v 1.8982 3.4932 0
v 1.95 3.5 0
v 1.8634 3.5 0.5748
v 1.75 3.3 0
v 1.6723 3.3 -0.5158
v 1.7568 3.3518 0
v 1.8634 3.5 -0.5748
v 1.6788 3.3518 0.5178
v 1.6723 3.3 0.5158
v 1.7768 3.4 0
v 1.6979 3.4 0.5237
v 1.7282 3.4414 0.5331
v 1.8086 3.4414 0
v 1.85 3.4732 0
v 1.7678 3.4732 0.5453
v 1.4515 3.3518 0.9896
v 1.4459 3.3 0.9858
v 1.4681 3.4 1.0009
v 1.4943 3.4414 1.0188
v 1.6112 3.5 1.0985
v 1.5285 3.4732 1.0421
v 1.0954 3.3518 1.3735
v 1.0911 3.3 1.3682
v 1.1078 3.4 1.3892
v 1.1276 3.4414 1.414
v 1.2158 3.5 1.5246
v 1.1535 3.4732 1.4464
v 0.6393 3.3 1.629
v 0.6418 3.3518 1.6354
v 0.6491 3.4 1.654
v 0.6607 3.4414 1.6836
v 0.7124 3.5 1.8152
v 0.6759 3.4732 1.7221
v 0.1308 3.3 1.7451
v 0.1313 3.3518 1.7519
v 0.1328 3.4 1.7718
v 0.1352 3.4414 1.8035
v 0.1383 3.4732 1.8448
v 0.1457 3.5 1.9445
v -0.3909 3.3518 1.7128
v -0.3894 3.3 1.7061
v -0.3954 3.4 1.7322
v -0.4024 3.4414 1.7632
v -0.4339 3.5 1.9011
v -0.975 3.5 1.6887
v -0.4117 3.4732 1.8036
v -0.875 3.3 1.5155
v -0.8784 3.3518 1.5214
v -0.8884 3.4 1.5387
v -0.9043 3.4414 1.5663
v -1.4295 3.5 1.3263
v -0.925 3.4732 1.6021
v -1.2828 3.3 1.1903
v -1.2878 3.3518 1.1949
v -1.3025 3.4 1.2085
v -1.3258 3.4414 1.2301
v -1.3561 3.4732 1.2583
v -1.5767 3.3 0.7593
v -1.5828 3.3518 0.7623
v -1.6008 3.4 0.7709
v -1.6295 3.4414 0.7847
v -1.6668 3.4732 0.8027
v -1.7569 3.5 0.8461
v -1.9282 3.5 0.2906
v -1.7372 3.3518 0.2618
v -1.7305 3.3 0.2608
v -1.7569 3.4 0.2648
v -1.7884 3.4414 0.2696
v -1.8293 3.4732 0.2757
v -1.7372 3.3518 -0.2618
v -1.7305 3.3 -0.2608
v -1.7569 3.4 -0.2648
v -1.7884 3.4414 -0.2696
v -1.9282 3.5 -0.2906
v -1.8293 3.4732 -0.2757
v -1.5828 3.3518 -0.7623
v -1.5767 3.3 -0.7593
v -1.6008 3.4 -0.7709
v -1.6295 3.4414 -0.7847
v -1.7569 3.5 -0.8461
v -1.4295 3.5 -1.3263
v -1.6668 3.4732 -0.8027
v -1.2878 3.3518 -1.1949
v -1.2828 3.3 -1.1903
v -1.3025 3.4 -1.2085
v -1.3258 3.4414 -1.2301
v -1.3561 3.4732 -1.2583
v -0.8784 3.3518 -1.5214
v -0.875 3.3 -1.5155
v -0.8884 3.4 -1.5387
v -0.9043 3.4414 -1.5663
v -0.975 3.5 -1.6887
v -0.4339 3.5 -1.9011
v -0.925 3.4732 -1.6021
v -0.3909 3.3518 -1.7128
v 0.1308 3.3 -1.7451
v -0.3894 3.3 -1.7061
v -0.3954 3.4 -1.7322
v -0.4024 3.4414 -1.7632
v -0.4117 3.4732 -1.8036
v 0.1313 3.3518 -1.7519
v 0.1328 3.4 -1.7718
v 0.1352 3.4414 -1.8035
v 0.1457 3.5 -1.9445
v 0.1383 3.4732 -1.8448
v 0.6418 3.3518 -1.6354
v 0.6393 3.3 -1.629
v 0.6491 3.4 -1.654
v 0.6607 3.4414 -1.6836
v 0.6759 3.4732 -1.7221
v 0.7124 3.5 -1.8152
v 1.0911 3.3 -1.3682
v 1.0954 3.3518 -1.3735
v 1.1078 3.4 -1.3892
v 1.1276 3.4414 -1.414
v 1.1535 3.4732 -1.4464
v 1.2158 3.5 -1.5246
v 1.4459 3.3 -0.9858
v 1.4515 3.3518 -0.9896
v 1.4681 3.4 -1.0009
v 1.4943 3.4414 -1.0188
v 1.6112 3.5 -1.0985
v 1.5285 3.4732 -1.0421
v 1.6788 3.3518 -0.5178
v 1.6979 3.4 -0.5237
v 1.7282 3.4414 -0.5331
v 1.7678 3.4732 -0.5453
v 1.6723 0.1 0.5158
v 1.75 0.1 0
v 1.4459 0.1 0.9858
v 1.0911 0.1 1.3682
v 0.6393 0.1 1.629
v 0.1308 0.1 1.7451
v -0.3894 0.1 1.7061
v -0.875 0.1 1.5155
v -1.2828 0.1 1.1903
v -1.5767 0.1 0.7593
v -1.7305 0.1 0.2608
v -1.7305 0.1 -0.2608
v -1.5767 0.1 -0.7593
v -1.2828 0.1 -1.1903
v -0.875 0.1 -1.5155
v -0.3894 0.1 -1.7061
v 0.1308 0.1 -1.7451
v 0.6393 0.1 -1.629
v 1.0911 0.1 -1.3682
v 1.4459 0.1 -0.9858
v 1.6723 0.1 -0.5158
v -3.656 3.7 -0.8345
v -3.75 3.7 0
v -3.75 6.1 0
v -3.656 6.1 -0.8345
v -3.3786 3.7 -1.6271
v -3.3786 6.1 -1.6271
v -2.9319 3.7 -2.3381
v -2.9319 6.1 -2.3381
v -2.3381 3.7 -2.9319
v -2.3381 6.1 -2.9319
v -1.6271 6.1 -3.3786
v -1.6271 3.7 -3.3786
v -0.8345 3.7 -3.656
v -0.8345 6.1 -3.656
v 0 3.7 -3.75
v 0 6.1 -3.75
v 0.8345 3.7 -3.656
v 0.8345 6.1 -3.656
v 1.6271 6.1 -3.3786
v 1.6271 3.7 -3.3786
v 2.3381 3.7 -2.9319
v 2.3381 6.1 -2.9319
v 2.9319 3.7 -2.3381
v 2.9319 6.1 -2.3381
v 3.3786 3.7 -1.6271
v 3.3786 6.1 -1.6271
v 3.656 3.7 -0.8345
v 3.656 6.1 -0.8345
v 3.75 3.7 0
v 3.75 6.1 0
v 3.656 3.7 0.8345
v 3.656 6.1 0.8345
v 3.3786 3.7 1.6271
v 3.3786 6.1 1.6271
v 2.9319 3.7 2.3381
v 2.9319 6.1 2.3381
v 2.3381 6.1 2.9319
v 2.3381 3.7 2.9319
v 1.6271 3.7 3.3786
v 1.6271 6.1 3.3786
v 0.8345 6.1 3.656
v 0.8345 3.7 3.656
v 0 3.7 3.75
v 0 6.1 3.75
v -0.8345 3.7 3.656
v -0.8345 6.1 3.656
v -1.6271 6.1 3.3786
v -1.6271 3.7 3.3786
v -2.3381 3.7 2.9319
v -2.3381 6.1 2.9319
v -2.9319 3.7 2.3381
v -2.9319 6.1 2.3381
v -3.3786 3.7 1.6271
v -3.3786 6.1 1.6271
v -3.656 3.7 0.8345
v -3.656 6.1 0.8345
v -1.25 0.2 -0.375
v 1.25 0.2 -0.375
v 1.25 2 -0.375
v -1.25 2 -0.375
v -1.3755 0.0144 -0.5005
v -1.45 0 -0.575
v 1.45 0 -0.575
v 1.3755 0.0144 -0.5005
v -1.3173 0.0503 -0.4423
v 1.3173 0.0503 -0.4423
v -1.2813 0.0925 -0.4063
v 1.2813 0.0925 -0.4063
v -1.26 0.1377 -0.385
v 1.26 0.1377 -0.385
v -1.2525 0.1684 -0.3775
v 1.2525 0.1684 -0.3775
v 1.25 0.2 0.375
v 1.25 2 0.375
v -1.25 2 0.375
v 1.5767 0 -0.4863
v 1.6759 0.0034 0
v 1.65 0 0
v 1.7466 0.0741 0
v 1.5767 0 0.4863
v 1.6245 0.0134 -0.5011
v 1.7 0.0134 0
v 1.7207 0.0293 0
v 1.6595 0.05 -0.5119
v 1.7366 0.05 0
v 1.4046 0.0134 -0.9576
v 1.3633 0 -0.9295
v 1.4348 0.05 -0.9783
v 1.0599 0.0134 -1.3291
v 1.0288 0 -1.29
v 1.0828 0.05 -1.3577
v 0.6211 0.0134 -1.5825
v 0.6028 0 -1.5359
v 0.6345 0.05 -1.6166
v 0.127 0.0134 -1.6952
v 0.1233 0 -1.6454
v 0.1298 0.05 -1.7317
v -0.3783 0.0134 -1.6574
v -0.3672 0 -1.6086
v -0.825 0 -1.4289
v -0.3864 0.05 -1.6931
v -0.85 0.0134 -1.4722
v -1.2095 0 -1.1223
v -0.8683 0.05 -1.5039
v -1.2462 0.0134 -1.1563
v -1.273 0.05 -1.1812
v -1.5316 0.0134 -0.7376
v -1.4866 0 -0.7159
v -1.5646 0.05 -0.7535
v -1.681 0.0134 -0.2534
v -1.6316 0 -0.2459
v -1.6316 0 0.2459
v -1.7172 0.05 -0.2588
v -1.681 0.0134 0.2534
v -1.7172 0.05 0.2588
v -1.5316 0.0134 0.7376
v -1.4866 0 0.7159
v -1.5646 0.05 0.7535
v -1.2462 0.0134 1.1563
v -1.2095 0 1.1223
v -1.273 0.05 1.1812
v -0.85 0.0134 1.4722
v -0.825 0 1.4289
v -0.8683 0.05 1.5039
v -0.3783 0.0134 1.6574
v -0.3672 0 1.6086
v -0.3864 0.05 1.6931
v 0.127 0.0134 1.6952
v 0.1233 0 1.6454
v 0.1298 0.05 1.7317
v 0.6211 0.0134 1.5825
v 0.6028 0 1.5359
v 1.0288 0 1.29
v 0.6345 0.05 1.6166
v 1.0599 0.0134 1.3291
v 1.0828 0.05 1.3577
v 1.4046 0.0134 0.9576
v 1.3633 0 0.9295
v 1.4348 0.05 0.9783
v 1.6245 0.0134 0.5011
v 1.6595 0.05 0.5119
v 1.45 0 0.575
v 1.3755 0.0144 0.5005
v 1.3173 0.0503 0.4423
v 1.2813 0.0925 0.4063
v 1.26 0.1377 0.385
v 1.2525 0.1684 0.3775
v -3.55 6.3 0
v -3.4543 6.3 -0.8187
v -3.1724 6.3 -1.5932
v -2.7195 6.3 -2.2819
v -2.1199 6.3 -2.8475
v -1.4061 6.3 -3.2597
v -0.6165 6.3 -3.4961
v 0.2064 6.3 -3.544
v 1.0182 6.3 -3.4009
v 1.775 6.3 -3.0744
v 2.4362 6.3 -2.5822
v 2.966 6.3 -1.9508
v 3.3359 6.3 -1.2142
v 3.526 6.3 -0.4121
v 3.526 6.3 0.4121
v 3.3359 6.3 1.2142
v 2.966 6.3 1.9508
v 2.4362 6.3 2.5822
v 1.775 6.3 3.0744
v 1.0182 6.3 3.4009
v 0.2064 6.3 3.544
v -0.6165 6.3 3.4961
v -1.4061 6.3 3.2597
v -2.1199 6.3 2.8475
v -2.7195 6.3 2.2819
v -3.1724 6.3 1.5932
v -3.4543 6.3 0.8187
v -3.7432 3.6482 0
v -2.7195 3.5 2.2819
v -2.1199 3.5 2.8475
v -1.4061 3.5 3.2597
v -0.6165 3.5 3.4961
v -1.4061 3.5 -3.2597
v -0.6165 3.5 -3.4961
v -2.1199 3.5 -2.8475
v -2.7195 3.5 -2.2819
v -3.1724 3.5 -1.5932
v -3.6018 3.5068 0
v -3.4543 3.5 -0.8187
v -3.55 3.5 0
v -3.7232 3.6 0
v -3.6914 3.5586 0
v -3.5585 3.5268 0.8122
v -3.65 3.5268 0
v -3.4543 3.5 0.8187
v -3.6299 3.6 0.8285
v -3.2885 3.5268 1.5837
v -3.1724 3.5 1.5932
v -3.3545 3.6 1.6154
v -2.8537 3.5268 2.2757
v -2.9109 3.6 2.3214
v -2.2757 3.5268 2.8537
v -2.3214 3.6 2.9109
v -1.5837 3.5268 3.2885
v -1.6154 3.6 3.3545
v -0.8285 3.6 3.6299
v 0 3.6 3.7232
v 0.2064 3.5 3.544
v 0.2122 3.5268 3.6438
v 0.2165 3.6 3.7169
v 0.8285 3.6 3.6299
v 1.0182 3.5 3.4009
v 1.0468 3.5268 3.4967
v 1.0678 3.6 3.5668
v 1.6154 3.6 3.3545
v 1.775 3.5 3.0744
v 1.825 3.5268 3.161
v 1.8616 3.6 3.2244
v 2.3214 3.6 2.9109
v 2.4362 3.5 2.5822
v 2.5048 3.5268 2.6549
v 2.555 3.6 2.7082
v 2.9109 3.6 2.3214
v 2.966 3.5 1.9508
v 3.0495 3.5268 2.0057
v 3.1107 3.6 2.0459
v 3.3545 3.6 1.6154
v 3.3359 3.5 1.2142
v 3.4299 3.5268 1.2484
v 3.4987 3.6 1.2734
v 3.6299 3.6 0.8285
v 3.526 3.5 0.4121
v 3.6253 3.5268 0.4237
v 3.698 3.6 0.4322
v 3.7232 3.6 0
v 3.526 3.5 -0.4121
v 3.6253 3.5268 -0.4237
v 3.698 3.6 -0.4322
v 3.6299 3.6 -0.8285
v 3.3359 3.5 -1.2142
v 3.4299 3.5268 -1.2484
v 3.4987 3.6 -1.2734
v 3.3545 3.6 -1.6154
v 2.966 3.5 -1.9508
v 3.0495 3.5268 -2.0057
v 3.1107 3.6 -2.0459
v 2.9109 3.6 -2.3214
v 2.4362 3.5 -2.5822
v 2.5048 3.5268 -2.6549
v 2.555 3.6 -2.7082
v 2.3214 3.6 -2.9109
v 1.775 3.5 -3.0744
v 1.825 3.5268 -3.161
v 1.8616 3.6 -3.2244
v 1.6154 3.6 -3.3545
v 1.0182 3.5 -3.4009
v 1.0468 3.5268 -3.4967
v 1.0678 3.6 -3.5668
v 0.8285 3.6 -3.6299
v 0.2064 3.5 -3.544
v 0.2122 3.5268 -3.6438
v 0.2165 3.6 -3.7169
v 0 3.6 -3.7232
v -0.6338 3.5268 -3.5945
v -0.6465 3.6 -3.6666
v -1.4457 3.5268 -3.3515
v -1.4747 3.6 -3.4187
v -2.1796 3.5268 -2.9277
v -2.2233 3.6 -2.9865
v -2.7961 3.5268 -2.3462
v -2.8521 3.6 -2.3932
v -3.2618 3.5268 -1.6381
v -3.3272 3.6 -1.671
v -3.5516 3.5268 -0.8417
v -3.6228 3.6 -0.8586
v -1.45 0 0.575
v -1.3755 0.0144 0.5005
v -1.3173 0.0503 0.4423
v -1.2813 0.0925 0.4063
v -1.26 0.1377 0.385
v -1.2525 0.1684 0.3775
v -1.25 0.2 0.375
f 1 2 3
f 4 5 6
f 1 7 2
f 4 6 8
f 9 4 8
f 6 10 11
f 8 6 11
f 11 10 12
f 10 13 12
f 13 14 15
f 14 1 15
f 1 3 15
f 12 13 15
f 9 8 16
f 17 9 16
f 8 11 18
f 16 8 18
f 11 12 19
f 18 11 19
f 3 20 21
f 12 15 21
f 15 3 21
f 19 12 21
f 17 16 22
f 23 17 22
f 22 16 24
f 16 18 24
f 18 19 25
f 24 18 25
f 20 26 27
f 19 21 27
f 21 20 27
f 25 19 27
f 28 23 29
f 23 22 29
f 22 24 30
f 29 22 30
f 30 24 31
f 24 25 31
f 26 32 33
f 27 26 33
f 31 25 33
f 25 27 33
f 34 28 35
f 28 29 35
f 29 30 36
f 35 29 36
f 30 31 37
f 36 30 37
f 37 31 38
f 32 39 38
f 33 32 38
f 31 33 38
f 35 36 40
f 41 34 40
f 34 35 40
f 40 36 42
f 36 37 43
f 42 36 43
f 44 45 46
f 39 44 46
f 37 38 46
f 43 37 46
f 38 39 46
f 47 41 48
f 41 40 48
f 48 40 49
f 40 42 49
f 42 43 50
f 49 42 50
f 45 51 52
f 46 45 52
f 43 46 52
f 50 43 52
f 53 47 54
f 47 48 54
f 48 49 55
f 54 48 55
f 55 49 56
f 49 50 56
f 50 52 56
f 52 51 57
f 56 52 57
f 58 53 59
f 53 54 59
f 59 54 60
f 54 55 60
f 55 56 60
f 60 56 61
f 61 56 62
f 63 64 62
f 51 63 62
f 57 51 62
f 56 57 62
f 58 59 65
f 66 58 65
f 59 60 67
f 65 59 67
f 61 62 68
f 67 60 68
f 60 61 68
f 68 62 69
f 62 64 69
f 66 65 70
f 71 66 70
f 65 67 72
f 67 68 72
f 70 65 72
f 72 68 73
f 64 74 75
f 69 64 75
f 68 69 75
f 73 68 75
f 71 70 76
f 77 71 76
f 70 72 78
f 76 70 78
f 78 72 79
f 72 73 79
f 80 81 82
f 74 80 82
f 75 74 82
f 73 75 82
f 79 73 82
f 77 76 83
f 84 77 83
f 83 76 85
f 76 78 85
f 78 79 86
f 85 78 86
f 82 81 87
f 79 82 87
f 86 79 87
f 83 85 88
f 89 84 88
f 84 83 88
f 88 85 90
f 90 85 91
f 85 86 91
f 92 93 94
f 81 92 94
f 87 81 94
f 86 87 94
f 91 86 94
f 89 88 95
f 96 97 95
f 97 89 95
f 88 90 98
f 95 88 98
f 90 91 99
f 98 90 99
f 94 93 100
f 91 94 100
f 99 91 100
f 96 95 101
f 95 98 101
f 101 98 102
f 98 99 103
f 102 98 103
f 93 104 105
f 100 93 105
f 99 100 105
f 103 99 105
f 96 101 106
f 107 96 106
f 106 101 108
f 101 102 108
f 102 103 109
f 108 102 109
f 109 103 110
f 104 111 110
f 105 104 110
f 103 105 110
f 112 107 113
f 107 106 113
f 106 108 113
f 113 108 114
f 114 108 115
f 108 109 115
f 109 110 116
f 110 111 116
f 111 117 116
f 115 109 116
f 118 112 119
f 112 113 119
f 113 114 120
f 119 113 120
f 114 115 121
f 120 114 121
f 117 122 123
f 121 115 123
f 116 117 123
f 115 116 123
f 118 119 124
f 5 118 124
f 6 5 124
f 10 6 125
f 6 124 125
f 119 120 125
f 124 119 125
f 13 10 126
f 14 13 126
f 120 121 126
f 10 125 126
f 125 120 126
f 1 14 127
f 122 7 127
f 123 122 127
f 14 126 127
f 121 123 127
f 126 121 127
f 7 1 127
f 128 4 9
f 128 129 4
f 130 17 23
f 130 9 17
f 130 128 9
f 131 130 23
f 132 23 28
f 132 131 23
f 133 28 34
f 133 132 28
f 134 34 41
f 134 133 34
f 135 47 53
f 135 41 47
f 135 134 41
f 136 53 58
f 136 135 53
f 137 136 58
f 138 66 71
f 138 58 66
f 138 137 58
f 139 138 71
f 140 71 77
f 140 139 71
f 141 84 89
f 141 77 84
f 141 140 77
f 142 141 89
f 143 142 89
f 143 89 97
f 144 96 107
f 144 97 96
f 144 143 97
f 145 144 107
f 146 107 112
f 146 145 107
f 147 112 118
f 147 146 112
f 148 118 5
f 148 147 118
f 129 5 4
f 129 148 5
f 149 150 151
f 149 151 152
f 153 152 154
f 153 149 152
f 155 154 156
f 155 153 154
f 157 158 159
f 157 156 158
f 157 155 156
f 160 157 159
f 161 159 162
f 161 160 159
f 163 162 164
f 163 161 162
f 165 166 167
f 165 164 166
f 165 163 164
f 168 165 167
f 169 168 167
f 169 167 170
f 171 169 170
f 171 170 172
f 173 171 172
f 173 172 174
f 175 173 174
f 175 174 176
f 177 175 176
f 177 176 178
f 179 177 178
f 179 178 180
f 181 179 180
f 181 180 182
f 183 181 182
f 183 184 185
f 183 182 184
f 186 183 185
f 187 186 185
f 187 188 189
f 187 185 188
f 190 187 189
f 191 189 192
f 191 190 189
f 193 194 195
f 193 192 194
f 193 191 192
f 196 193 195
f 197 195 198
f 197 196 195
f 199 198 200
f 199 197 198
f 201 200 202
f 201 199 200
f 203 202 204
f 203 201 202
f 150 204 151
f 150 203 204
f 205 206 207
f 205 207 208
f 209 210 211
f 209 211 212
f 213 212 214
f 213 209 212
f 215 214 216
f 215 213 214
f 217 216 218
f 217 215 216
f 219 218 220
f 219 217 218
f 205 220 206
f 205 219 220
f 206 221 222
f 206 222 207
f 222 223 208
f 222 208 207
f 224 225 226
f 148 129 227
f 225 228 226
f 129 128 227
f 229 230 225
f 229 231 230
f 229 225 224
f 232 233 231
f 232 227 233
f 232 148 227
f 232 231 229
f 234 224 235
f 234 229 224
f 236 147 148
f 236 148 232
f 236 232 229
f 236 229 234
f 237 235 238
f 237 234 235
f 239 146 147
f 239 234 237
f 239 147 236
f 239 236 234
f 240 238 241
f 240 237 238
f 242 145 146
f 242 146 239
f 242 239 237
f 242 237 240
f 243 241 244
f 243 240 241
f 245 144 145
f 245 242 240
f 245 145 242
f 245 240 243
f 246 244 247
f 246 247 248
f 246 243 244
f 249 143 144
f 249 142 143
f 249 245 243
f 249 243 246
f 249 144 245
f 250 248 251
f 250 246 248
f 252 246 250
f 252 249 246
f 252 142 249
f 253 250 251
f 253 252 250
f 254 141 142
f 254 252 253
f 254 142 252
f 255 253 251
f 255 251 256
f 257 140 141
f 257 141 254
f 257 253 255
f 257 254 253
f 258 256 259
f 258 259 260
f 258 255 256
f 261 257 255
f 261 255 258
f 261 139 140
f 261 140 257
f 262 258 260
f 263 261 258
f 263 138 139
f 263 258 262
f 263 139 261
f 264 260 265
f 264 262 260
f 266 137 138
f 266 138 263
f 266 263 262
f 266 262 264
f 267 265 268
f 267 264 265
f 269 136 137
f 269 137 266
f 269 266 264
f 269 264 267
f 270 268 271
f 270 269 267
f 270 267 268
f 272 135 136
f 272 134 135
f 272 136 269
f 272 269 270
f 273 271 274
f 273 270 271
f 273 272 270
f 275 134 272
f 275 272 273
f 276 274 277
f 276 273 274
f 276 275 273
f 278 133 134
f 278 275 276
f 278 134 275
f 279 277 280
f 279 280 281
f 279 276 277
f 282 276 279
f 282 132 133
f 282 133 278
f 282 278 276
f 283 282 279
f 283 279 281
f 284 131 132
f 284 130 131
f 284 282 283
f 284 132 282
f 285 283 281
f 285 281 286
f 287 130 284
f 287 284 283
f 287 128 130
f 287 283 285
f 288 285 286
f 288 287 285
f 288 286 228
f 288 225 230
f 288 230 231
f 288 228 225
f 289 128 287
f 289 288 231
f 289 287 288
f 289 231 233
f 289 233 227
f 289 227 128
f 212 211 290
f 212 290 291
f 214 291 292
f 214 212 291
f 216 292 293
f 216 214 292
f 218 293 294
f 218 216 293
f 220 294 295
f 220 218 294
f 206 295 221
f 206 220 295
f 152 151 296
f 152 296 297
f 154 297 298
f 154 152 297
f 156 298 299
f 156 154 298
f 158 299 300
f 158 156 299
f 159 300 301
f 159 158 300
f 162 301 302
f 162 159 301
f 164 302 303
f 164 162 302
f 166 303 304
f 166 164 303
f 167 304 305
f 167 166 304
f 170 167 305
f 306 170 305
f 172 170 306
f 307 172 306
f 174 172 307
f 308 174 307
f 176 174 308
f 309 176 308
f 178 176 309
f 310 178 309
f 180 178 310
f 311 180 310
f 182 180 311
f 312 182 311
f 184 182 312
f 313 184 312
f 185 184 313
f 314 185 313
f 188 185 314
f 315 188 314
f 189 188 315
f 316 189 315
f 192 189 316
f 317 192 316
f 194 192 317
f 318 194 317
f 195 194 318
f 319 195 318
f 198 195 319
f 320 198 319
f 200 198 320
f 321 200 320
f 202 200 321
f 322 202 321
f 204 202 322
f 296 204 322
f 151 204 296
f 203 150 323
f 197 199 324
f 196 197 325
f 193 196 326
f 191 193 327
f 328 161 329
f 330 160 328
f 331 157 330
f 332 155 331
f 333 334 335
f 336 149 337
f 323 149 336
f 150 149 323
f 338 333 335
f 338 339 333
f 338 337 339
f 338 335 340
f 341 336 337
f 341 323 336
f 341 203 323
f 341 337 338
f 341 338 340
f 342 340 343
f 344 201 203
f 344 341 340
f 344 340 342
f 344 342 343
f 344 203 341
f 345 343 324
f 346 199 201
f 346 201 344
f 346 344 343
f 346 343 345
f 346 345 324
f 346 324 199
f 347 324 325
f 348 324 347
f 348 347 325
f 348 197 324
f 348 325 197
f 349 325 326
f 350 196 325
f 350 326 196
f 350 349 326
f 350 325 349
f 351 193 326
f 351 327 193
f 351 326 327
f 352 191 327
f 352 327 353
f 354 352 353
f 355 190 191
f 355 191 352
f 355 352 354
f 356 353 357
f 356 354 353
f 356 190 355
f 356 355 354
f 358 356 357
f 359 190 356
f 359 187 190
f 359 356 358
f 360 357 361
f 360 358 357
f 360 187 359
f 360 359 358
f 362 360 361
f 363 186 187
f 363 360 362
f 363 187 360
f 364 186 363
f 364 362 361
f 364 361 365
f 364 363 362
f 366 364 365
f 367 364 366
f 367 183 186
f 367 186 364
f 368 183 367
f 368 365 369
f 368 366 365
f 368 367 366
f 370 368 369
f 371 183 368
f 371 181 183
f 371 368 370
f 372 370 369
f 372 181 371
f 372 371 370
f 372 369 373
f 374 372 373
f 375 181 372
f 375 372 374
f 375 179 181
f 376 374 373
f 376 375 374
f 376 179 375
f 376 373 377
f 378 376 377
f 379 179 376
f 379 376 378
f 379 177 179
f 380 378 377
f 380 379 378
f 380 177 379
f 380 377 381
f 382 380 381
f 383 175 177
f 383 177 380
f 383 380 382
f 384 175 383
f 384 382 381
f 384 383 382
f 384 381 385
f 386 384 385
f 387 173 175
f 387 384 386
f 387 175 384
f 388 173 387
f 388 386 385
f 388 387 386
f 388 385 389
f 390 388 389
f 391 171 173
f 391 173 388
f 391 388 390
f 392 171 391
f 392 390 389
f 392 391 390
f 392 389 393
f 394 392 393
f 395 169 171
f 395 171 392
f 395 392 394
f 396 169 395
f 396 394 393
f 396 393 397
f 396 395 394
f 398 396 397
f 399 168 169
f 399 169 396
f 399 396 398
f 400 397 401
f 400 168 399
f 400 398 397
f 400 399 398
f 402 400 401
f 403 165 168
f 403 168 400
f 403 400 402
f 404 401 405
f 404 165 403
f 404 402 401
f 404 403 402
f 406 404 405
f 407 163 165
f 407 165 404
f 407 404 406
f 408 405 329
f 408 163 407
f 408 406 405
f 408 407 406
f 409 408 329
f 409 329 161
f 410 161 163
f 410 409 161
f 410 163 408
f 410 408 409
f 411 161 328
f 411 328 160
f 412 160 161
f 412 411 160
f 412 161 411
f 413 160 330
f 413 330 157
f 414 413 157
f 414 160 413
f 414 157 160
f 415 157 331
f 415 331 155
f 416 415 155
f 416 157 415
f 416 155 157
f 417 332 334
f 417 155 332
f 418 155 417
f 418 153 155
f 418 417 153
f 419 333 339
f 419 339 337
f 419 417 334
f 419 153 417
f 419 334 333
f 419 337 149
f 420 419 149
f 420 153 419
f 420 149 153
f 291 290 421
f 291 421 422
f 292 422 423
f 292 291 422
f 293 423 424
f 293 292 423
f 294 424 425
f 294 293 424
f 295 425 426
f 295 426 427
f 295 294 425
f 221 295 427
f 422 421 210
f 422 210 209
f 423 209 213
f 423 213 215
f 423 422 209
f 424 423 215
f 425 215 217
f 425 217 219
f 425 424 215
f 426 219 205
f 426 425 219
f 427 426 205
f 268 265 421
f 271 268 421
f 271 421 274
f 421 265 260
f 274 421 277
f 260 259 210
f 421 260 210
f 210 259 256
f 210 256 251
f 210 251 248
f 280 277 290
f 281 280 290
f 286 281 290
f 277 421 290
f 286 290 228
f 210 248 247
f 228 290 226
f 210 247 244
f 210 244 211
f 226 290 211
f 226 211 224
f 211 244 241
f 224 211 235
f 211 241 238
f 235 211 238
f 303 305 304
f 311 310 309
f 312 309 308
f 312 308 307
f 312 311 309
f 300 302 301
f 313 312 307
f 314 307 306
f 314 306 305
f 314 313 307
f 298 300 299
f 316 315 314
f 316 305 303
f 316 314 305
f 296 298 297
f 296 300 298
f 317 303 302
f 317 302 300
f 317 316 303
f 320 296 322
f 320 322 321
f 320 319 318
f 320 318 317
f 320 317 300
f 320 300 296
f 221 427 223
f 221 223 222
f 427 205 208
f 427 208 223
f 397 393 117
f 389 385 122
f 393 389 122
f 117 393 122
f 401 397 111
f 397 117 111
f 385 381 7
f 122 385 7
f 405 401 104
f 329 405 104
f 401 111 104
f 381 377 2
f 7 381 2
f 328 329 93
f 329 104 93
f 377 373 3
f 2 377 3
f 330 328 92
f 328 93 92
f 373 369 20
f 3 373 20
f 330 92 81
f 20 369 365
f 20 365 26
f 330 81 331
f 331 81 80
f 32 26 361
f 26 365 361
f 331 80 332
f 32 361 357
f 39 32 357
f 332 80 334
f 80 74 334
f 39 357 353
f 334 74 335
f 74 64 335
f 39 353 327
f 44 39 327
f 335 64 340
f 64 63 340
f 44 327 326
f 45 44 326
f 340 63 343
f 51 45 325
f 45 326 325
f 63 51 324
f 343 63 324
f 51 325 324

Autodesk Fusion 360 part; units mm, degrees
sketch "Sketch1" plane through (0, 0, 0) normal (0, 1, 0) x (1, 0, 0)
  circle A0 centre (0, 0) radius 1.75
  dimension "d135" = 3.5
extrude "Extrude1" add sketch "Sketch1" along normal blind 3.5
sketch "Sketch2" plane through (0, 3.5, 0) normal (0, 1, 0) x (-1, 0, 0)
  circle A0 centre (0, 0) radius 1.75
  circle A1 centre (0, 0) radius 3.75
  dimension "d138" = 7.5
extrude "Extrude2" add sketch "Sketch2" along normal blind 2.8 contours A0 | A1
sketch "Sketch3" plane through (0, 0, 0) normal (0, -1, 0) x (1, 0, 0)
  circle A0 centre (0, 0) radius 1.75
  line L0 (1.25, -0.375) -> (-1.25, -0.375)
  line L1 (-1.25, -0.375) -> (-1.25, 0.375)
  line L2 (-1.25, 0.375) -> (1.25, 0.375)
  line L3 (1.25, 0.375) -> (1.25, -0.375)
  line L4 (1.25, -0.375) -> (-1.25, 0.375) construction
  line L5 (-1.25, -0.375) -> (1.25, 0.375) construction
  dimension "d141" = 2.5
  dimension "d142" = 0.75
extrude "Extrude3" cut sketch "Sketch3" against normal blind 2 contours L0 L1 L2 L3
fillet "Fillet1" radius 0.2 4 edges at (-1.25, 0, 0) (0, 0, 0.375) (1.25, 0, 0) (0, 0, -0.375)
fillet "Fillet2" radius 0.1 1 edges at (-1.6316, 0, 0.6328)
fillet "Fillet3" radius 0.2 1 edges at (-1.6316, 3.5, 0.6328)
fillet "Fillet4" radius 0.2 1 edges at (3.4962, 3.5, -1.3561)
chamfer "Chamfer1" distance 0.2 angle 45 1 edges at (3.4962, 6.3, -1.3561)
equation "d135 = Shaft_Dia"
equation "d136 = Shaft_Length"
equation "d138 = Head_Dia"
equation "d139 = Head_Thk"
equation "d141 = Slot_Length"
equation "d142 = Slot_Width"
equation "d143 = -Slot_Depth"
equation "Head_Dia = 7.5 mm"
equation "Shaft_Dia = 3.5 mm"
equation "Head_Thk = 2.8 mm"
equation "Shaft_Length = 3.5 mm"
equation "Slot_Depth = 2 mm"
equation "Slot_Width = 0.75 mm"
equation "Slot_Length = 2.5 mm"
